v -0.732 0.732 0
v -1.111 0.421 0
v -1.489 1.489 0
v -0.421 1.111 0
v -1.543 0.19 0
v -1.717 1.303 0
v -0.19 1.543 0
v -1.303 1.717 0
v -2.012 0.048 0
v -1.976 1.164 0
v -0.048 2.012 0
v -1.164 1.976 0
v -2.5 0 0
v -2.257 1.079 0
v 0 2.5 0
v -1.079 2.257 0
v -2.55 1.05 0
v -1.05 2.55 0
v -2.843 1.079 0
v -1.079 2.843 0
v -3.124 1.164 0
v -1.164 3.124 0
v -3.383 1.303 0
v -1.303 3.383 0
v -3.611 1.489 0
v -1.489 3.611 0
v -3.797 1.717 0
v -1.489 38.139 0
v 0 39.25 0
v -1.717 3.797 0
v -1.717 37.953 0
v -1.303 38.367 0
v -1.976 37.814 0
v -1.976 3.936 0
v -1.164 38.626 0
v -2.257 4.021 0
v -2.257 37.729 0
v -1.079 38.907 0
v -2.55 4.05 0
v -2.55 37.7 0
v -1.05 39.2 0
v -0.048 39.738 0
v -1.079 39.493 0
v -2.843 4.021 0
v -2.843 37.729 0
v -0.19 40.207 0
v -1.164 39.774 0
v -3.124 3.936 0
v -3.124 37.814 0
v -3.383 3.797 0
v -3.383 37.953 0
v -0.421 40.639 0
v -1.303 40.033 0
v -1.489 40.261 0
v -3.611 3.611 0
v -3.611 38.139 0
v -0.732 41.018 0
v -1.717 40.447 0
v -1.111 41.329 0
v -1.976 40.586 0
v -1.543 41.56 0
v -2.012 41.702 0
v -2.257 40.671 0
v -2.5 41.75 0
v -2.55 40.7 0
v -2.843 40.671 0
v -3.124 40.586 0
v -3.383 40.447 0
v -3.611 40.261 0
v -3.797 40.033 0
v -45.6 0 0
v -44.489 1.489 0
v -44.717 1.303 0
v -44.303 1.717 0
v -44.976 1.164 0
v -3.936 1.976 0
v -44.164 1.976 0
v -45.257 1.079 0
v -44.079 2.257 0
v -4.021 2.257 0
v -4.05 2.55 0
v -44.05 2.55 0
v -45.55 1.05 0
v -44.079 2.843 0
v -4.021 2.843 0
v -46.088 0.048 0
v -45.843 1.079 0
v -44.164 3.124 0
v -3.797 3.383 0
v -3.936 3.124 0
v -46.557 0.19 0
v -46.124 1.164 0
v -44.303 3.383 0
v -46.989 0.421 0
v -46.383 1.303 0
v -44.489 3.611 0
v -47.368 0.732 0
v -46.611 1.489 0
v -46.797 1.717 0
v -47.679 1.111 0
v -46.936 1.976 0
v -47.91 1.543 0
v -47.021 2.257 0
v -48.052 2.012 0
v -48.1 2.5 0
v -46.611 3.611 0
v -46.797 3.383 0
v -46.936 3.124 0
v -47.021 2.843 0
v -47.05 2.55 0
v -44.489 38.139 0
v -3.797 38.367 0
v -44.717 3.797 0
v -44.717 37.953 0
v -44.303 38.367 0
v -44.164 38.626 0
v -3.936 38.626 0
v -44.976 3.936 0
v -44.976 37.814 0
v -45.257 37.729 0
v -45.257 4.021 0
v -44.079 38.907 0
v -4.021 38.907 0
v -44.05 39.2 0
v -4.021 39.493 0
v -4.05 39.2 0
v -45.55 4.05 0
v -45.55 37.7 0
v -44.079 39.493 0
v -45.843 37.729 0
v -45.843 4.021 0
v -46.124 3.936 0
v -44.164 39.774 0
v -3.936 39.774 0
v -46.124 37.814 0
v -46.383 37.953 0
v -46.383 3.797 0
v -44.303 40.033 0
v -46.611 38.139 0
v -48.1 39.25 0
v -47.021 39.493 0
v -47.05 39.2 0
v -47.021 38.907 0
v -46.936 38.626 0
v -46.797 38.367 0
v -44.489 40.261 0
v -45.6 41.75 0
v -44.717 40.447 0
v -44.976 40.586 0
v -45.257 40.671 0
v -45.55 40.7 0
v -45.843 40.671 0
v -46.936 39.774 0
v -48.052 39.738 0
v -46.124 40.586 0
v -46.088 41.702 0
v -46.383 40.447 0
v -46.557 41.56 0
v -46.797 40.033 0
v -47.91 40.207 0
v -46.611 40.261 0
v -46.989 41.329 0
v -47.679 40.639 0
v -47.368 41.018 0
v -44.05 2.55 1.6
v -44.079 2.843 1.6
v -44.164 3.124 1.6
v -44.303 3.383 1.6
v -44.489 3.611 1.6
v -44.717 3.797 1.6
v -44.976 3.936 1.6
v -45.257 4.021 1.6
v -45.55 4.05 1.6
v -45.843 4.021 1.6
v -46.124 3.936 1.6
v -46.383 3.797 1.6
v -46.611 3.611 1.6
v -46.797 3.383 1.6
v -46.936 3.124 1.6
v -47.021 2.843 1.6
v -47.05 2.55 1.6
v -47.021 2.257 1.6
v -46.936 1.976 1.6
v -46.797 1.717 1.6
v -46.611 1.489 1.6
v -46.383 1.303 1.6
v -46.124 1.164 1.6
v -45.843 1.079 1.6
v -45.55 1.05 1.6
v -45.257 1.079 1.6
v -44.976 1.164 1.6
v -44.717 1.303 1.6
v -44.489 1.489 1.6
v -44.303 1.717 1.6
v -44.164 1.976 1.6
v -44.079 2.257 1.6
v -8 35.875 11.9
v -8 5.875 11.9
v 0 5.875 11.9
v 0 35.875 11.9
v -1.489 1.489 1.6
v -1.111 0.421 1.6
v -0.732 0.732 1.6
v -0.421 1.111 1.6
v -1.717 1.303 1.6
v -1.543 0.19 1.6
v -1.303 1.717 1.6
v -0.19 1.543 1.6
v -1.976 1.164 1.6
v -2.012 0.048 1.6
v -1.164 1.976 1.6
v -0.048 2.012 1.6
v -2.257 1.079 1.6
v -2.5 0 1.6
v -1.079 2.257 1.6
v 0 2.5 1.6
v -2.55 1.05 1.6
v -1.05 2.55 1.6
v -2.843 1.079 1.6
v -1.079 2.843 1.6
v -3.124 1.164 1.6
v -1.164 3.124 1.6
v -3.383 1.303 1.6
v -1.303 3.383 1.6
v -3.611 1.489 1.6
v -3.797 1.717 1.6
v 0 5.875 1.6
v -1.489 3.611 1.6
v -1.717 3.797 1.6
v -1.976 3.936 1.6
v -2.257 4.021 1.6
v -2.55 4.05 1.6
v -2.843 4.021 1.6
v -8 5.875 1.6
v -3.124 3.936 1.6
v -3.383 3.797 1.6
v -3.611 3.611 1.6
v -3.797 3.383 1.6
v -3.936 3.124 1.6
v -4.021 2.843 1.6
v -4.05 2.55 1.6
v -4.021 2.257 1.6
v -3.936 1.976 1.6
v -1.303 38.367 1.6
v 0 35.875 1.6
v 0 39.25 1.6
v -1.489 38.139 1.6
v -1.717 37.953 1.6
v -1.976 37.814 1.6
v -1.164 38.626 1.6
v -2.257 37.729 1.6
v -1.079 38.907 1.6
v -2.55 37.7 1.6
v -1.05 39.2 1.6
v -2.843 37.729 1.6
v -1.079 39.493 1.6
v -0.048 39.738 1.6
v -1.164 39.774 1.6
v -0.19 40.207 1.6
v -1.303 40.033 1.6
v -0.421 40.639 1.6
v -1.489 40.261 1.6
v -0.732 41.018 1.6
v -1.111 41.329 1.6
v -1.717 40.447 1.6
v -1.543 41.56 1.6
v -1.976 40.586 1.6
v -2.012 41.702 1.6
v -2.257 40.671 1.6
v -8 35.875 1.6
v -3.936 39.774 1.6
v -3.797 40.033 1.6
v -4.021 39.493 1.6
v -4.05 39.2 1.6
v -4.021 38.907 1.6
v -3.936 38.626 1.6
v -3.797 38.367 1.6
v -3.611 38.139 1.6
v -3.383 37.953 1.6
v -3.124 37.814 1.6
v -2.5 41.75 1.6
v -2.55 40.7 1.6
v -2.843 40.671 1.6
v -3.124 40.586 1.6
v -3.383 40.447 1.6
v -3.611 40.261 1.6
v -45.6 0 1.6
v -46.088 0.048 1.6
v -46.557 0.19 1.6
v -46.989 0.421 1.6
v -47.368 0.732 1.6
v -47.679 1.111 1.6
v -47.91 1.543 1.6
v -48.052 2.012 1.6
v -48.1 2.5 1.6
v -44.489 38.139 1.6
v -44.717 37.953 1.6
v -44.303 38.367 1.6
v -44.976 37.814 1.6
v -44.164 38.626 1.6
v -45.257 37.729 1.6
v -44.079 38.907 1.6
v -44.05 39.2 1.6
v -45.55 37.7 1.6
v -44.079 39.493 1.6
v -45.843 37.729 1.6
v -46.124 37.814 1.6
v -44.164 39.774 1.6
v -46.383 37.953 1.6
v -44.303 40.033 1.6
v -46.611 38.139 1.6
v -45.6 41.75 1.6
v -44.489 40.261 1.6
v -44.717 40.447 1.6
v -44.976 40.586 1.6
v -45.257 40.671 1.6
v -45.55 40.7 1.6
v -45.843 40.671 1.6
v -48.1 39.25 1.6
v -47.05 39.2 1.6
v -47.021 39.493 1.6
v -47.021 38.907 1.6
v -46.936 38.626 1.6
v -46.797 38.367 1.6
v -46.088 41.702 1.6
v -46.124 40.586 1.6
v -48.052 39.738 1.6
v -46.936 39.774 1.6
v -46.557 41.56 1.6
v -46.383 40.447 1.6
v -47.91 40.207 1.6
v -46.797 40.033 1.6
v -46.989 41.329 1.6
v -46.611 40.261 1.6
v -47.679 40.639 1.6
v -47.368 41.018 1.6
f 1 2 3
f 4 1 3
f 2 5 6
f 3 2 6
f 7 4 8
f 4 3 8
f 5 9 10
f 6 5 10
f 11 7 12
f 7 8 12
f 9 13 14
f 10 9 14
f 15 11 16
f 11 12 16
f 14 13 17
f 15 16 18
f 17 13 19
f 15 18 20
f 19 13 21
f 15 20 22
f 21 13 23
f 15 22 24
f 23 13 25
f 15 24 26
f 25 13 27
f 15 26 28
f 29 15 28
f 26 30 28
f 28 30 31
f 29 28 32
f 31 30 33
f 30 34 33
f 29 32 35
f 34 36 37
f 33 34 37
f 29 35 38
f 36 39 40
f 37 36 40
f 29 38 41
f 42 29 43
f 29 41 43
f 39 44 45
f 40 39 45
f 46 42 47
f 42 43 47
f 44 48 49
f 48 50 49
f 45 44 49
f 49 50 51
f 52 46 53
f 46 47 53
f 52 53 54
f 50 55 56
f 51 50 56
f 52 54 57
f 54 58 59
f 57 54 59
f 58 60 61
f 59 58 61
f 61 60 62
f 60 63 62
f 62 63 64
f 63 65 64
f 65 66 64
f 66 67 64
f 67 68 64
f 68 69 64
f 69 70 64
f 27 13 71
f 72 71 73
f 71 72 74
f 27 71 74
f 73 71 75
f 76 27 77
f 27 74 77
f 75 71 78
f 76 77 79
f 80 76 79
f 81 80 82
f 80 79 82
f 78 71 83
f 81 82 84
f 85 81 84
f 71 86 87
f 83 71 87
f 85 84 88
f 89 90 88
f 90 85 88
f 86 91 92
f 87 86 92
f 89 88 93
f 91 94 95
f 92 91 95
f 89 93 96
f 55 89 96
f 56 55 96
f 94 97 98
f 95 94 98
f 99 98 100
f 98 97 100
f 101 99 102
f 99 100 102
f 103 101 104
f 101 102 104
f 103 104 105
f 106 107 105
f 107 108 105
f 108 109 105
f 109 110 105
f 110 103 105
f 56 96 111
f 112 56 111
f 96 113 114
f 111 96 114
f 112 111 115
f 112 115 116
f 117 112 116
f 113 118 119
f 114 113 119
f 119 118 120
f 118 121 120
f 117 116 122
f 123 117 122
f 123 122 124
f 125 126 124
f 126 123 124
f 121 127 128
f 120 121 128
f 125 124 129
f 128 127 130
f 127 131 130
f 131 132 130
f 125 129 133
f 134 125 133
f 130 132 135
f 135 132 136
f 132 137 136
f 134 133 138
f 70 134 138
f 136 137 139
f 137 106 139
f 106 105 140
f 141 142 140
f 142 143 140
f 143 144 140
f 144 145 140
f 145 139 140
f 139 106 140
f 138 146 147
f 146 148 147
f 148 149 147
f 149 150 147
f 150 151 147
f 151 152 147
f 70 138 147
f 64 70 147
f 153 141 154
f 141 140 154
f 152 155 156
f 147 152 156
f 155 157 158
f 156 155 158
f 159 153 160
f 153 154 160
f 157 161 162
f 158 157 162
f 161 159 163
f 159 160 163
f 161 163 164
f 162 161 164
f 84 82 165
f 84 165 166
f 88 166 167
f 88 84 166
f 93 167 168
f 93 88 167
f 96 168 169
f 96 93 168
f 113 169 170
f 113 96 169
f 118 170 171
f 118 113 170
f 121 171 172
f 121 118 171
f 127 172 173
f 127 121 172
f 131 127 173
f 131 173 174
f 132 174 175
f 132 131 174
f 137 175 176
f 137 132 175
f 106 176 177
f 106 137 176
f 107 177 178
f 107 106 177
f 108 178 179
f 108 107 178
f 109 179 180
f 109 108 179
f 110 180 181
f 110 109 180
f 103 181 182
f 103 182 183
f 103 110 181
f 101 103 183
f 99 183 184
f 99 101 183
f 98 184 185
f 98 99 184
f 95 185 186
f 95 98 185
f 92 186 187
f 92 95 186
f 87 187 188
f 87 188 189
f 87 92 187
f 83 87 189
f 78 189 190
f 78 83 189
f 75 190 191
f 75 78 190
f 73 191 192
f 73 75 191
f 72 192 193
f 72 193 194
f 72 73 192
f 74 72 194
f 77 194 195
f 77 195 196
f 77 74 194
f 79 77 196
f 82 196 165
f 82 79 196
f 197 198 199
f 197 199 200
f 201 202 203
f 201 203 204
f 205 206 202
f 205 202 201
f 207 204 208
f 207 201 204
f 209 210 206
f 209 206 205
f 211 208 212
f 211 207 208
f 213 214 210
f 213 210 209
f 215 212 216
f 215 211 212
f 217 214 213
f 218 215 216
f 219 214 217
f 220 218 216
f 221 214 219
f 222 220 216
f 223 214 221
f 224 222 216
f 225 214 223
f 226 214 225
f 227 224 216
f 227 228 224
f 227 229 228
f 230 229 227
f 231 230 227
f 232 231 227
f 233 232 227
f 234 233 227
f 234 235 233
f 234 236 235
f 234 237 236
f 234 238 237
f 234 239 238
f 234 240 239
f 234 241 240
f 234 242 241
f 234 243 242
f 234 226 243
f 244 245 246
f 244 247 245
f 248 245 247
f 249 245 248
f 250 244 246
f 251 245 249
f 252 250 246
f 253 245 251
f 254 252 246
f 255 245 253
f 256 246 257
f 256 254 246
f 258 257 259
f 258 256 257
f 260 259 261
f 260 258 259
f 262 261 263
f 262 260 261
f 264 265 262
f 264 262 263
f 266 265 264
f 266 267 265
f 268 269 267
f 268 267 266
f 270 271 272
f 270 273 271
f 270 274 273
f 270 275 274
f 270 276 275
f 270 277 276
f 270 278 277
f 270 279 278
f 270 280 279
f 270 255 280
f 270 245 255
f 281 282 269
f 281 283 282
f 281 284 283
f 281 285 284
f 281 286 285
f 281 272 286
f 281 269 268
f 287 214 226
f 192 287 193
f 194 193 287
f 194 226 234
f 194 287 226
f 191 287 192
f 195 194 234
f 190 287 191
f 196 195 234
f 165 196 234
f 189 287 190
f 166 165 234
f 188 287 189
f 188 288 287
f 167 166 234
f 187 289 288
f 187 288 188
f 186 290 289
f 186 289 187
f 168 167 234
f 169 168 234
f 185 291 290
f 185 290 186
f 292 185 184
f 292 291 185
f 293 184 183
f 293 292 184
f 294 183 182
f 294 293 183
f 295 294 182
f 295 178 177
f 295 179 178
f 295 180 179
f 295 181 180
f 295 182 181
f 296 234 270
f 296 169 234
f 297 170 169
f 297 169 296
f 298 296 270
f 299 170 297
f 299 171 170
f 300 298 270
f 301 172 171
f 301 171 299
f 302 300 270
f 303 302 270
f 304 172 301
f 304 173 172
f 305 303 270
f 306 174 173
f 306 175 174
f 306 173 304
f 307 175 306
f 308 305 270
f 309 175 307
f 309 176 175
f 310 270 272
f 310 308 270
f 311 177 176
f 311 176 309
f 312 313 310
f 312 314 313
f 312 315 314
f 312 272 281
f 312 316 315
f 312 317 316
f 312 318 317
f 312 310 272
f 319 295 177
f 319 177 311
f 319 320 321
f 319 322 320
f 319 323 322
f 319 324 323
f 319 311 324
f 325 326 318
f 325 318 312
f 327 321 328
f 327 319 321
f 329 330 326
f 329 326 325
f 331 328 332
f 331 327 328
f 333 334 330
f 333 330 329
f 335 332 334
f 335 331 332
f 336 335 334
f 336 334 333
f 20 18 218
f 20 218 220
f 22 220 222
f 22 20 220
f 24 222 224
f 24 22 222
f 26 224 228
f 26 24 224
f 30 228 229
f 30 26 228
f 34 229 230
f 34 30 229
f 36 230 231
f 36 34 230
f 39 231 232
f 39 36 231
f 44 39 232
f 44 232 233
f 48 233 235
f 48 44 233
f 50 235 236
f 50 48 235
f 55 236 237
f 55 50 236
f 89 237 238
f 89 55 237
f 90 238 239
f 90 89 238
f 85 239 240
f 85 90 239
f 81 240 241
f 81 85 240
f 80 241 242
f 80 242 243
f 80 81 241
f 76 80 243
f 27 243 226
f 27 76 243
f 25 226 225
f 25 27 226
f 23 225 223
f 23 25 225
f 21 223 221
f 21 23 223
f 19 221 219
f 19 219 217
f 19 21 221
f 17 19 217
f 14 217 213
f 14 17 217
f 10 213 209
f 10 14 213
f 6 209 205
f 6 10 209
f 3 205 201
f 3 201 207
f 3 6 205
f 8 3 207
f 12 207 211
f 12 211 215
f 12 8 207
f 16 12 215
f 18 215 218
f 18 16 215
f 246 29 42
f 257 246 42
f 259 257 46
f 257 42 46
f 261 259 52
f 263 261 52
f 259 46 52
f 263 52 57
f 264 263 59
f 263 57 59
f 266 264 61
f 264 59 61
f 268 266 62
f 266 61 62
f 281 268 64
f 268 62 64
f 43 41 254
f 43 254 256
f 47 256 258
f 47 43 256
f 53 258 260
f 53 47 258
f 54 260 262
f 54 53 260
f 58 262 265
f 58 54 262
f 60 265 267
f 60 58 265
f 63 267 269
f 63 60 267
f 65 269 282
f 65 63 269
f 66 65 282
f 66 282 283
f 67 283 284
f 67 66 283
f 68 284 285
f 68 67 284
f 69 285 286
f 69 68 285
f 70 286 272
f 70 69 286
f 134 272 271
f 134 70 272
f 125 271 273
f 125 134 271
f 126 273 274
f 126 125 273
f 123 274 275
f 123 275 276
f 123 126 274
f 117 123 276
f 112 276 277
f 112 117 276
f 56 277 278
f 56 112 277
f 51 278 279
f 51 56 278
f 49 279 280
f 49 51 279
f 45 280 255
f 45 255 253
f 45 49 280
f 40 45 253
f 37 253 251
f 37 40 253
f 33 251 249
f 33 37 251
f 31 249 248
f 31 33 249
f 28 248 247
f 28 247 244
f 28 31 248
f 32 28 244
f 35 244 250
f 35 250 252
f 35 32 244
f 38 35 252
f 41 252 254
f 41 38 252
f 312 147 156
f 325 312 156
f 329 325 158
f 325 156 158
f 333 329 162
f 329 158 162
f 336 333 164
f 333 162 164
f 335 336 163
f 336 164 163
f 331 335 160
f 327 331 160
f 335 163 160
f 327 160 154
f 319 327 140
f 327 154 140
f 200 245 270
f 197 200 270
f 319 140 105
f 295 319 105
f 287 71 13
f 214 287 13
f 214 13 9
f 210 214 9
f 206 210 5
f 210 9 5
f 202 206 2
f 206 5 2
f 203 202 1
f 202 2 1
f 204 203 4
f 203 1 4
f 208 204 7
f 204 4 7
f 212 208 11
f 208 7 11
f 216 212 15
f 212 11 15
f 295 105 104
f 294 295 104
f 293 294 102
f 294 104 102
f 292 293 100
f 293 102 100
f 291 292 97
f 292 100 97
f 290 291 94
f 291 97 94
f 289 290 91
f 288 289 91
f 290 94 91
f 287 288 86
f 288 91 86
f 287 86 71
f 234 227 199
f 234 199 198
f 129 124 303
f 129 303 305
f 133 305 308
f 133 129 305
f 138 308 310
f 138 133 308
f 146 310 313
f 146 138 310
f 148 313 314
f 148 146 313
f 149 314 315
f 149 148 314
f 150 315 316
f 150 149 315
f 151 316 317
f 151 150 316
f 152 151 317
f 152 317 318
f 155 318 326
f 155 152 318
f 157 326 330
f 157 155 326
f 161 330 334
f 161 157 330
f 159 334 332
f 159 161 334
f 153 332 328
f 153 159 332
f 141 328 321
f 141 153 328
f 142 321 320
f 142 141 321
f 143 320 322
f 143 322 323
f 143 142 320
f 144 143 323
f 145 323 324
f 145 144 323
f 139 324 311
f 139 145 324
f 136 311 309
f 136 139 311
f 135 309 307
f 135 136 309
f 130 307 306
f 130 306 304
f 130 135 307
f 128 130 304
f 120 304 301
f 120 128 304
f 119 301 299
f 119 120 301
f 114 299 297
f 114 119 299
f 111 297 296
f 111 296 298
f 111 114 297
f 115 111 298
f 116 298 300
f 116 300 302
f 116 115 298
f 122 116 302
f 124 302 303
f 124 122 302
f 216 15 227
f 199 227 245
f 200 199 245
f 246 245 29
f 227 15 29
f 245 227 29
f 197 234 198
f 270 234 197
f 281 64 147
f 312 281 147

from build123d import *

# Parameters (mm, degrees)
SKETCH1_R           = 1.5
BOSS_EXTRUDE1_DEPTH = 1.6
SKETCH1_3_W         = 30
SKETCH1_3_H         = 8
BOSS_EXTRUDE2_DEPTH = 11.9


with BuildPart() as part:
    # Sketch1 → Boss-Extrude1 (new body)
    with BuildSketch(Plane(origin=(0, 0, 0), x_dir=(0, 1, 0), z_dir=(0, 0, 1))):
        with BuildLine():
            ThreePointArc((0, 2.5), (0.732233047, 0.732233047), (2.5, 0))
            Line((2.5, 0), (39.25, 0))
            ThreePointArc((39.25, 0), (41.017766953, 0.732233047), (41.75, 2.5))
            Line((41.75, 2.5), (41.75, 45.6))
            ThreePointArc((41.75, 45.6), (41.017766953, 47.367766953), (39.25, 48.1))
            Line((39.25, 48.1), (2.5, 48.1))
            ThreePointArc((2.5, 48.1), (0.732233047, 47.367766953), (0, 45.6))
            Line((0, 45.6), (0, 2.5))
        make_face()
        with Locations((2.549913685, 2.549913685)):
            Circle(SKETCH1_R, mode=Mode.SUBTRACT)
        with Locations((39.200086315, 2.549913685)):
            Circle(SKETCH1_R, mode=Mode.SUBTRACT)
        with Locations((2.549913685, 45.550086315)):
            Circle(SKETCH1_R, mode=Mode.SUBTRACT)
        with Locations((39.200086315, 45.550086315)):
            Circle(SKETCH1_R, mode=Mode.SUBTRACT)
    extrude(amount=BOSS_EXTRUDE1_DEPTH)

    # Sketch1<3> → Boss-Extrude2 (add)
    with BuildSketch(Plane(origin=(0, 0, 0), x_dir=(0, 1, 0), z_dir=(0, 0, 1))):
        with Locations((20.875, 4)):
            Rectangle(SKETCH1_3_W, SKETCH1_3_H)
    extrude(amount=BOSS_EXTRUDE2_DEPTH)


solid = part.part
